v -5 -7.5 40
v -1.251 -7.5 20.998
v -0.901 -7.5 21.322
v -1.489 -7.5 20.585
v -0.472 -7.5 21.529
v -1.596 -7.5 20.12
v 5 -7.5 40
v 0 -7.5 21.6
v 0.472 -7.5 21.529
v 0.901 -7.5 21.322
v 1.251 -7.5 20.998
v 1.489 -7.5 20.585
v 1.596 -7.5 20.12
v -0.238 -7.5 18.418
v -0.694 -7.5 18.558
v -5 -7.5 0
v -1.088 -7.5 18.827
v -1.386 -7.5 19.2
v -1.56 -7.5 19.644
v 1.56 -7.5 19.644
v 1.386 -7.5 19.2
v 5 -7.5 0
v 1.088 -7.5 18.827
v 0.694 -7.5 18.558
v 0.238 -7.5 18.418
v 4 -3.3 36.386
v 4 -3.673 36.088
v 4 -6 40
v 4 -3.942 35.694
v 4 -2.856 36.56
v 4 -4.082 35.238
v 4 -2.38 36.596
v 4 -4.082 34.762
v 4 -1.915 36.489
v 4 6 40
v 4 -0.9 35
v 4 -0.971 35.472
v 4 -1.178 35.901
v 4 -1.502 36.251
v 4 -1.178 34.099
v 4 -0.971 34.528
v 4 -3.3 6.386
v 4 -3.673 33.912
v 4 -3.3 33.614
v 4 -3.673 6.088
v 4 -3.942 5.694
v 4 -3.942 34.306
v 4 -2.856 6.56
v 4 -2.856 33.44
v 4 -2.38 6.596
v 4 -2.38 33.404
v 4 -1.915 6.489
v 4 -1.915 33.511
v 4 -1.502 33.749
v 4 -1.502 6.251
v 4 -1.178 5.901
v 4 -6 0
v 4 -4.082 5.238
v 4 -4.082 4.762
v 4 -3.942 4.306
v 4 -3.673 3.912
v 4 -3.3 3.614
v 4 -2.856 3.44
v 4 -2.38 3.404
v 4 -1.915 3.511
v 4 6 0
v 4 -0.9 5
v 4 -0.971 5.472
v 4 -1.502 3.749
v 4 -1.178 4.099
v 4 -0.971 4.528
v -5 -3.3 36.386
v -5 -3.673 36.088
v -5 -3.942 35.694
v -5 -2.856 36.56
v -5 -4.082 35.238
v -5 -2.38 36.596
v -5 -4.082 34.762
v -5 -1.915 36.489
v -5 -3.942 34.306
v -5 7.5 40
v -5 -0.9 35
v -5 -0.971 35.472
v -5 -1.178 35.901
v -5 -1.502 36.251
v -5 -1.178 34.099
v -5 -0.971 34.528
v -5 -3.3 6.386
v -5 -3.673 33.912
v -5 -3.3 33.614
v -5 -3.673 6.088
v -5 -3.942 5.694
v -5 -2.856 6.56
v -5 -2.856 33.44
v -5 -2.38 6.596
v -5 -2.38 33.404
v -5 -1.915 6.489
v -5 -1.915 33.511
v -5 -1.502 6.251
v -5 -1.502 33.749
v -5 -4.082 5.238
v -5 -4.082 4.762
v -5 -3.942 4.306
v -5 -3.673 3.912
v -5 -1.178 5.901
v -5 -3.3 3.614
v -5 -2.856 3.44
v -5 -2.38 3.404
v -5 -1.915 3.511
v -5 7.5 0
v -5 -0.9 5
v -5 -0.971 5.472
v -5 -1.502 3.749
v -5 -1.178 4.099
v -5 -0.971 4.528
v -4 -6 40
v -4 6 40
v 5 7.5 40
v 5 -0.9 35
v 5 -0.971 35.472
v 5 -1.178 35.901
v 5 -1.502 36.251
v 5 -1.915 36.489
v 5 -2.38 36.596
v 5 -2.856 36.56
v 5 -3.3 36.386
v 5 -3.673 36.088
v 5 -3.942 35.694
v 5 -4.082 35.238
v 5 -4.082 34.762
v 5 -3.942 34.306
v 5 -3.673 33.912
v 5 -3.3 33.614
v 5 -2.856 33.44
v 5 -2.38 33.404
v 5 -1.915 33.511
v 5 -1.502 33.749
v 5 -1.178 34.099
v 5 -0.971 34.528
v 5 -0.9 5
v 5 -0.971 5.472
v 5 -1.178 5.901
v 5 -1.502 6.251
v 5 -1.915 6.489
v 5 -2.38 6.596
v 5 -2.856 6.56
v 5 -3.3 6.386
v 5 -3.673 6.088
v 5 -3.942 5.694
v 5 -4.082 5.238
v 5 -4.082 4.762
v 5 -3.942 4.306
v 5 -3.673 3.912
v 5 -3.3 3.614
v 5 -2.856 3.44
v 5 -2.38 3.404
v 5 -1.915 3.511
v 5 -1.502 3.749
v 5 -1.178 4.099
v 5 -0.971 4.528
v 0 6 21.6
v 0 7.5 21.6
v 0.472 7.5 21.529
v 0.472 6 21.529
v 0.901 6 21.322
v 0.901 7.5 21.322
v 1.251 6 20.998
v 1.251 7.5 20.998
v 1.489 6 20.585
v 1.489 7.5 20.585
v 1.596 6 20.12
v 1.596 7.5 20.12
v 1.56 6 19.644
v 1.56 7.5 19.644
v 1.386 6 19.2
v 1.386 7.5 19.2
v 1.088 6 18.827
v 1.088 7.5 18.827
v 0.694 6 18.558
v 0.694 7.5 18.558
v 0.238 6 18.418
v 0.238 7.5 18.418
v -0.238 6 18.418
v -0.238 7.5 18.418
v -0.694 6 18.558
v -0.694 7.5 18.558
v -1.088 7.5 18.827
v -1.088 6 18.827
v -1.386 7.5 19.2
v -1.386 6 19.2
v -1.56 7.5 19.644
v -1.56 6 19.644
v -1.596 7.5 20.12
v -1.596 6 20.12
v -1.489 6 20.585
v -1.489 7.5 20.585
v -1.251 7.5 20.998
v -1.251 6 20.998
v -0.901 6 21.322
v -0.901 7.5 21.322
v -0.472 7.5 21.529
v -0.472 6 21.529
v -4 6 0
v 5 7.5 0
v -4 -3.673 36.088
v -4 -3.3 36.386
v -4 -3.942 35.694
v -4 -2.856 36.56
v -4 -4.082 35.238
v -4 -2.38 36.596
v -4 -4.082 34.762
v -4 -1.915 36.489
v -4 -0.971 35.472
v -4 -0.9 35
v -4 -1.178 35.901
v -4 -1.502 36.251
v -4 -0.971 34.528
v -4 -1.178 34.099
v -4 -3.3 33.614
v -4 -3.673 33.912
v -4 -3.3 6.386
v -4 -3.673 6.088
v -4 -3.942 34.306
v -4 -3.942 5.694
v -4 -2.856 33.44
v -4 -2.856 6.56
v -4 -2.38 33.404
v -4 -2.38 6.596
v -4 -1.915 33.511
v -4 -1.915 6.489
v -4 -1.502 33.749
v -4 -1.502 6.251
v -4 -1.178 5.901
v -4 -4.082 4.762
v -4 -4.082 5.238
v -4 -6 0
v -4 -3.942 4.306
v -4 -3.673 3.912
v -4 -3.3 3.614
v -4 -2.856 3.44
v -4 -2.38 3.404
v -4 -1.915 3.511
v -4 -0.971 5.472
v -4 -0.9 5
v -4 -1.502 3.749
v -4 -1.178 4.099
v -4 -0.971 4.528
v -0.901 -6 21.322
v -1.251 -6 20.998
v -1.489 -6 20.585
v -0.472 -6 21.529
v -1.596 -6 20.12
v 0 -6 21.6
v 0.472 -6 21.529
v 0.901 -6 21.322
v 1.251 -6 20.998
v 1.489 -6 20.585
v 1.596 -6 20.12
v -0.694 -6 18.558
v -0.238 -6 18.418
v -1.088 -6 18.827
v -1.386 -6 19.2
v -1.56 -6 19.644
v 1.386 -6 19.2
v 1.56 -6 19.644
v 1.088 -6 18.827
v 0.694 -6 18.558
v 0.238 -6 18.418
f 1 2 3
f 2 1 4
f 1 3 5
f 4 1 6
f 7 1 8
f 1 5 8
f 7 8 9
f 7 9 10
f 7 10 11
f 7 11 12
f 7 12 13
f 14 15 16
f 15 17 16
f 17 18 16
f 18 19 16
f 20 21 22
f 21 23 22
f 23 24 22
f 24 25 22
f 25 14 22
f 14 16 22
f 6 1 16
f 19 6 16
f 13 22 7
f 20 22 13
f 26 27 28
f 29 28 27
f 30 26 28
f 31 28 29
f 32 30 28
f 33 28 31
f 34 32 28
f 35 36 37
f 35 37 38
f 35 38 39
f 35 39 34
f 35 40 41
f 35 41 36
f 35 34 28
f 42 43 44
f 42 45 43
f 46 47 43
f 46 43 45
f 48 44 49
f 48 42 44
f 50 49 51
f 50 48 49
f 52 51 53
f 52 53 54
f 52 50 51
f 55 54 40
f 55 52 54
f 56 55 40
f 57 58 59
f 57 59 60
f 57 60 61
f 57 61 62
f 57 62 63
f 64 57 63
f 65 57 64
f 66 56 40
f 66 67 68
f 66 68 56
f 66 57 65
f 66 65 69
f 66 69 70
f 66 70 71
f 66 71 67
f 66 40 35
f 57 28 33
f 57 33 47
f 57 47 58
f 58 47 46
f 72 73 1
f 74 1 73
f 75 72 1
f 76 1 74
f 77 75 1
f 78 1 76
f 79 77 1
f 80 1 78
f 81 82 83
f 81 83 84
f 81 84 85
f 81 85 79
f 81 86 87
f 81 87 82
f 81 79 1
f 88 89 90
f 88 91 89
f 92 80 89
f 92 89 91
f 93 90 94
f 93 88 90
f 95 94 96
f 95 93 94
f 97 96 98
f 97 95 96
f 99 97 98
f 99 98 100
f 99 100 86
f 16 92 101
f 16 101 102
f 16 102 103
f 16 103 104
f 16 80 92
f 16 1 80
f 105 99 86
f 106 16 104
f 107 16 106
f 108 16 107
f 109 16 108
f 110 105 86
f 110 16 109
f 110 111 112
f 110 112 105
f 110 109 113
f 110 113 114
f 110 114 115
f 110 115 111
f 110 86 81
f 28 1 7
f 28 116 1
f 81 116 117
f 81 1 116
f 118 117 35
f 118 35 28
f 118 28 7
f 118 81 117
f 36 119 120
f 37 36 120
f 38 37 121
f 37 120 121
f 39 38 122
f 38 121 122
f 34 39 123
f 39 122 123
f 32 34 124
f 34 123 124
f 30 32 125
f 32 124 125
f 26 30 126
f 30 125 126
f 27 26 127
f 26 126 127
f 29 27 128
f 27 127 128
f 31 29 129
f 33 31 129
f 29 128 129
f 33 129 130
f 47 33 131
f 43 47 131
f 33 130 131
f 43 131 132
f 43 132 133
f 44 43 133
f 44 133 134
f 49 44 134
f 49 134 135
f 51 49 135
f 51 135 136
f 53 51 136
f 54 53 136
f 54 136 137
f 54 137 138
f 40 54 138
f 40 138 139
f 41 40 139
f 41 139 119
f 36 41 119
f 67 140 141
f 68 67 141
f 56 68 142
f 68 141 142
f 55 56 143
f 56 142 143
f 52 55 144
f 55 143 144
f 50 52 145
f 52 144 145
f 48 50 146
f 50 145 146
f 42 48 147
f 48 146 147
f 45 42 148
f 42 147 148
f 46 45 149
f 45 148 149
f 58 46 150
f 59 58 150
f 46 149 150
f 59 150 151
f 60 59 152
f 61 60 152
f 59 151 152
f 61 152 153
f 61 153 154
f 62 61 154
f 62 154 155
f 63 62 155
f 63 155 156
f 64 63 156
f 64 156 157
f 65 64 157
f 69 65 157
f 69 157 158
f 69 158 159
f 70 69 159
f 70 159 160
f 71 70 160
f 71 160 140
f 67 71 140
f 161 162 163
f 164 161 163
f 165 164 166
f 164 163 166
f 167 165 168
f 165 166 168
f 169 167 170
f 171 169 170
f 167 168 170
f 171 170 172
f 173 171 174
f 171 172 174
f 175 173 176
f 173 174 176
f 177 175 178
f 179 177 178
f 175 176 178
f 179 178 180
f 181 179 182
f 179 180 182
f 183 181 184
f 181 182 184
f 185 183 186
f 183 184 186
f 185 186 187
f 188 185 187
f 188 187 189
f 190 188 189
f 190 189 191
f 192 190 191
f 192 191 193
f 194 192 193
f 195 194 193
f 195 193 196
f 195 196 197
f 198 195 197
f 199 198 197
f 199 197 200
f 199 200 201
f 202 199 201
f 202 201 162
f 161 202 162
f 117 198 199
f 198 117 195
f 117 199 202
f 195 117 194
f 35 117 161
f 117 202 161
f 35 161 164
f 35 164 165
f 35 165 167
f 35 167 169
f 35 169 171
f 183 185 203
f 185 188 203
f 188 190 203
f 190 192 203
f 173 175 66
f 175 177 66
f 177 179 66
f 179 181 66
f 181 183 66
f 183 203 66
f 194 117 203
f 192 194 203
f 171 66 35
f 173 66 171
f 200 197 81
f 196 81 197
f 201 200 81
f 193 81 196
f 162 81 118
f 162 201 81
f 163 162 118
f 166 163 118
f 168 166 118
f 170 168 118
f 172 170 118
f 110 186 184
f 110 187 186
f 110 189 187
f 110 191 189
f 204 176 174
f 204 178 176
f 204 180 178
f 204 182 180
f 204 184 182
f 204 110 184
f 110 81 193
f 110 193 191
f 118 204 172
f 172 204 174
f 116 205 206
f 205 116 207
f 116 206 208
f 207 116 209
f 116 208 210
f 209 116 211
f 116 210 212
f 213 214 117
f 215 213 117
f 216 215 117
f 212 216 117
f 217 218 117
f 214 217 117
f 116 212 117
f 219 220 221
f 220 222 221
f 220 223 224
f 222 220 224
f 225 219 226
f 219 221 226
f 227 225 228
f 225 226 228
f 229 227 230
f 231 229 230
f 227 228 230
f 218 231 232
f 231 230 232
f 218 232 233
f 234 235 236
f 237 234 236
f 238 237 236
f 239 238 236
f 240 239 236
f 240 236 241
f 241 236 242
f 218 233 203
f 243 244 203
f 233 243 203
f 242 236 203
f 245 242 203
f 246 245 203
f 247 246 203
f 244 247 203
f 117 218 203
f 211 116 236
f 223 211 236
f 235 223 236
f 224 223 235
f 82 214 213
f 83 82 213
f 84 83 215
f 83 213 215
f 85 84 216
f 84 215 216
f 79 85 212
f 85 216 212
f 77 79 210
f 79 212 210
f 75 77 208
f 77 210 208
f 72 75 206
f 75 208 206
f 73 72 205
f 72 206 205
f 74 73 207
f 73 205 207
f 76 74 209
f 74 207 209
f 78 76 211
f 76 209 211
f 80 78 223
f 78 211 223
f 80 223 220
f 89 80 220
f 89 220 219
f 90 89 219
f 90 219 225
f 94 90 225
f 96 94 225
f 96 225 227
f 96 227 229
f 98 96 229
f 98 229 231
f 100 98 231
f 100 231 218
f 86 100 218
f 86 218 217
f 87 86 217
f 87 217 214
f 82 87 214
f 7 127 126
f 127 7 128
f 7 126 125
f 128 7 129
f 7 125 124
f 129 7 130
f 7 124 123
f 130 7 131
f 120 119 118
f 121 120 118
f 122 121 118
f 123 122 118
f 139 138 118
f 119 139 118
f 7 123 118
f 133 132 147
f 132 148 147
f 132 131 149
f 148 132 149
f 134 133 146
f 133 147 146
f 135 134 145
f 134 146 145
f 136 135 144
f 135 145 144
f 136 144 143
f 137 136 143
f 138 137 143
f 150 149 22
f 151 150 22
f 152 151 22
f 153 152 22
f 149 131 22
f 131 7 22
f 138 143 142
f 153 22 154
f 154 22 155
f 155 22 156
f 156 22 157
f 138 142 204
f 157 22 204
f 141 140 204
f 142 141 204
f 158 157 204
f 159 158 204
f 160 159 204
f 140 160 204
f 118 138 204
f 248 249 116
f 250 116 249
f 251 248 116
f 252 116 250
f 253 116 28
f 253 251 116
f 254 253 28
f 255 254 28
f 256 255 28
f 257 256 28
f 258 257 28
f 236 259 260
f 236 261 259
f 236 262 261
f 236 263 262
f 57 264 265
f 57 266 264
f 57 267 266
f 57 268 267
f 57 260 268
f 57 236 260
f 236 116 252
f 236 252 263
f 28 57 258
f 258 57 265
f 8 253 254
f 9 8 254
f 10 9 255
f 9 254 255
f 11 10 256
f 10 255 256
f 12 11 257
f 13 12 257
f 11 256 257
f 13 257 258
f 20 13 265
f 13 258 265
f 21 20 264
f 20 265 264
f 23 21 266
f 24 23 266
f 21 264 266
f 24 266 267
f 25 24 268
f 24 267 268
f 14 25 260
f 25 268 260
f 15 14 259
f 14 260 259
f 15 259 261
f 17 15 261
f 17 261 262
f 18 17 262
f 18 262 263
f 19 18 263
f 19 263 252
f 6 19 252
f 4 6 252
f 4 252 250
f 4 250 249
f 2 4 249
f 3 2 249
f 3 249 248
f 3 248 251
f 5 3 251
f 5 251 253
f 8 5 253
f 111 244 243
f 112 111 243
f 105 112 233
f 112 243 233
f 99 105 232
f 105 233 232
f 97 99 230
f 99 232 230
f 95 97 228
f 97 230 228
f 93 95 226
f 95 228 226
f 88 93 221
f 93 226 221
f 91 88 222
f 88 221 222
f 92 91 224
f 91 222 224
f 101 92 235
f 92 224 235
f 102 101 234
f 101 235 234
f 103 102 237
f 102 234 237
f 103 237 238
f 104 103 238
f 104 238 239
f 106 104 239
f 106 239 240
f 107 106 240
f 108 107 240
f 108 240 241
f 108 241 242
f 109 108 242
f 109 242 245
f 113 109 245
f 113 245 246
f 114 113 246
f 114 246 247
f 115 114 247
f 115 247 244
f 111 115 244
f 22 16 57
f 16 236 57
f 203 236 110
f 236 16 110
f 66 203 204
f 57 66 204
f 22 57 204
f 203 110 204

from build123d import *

# Parameters (mm, degrees)
SKETCH_1_W          = 10
SKETCH_1_H          = 15
SKETCH_1_W_2        = 8
SKETCH_1_H_2        = 12
EXTRUDE_1_DEPTH     = 40
SKETCH_2_R          = 1.6
CUT_EXTRUDE_1_DEPTH = 44.011626335
SKETCH_3_R          = 1.6
CUT_EXTRUDE_2_DEPTH = 42.907636536


with BuildPart() as part:
    # ｽｹｯﾁ1 → ﾎﾞｽ - 押し出し1 (new body)
    with BuildSketch(Plane.XY):
        Rectangle(SKETCH_1_W, SKETCH_1_H)
        Rectangle(SKETCH_1_W_2, SKETCH_1_H_2, mode=Mode.SUBTRACT)
    extrude(amount=EXTRUDE_1_DEPTH)

    # ｽｹｯﾁ2 → ｶｯﾄ - 押し出し1 (cut, through all)
    with BuildSketch(Plane(origin=(0, 7.5, 0), x_dir=(1, 0, 0), z_dir=(0, 1, 0))):
        with Locations(Location((0, -20, 0), (0, 0, 270))):
            Circle(SKETCH_2_R)
    extrude(amount=-CUT_EXTRUDE_1_DEPTH, mode=Mode.SUBTRACT)

    # ｽｹｯﾁ3 → ｶｯﾄ - 押し出し2 (cut, through all)
    with BuildSketch(Plane(origin=(5, 0, 0), x_dir=(0, 0, -1), z_dir=(1, 0, 0))):
        with Locations(Location((-35, -2.5, 0), (0, 0, 90))):
            Circle(SKETCH_3_R)
        with Locations(Location((-5, -2.5, 0), (0, 0, 90))):
            Circle(SKETCH_3_R)
    extrude(amount=-CUT_EXTRUDE_2_DEPTH, mode=Mode.SUBTRACT)


solid = part.part
